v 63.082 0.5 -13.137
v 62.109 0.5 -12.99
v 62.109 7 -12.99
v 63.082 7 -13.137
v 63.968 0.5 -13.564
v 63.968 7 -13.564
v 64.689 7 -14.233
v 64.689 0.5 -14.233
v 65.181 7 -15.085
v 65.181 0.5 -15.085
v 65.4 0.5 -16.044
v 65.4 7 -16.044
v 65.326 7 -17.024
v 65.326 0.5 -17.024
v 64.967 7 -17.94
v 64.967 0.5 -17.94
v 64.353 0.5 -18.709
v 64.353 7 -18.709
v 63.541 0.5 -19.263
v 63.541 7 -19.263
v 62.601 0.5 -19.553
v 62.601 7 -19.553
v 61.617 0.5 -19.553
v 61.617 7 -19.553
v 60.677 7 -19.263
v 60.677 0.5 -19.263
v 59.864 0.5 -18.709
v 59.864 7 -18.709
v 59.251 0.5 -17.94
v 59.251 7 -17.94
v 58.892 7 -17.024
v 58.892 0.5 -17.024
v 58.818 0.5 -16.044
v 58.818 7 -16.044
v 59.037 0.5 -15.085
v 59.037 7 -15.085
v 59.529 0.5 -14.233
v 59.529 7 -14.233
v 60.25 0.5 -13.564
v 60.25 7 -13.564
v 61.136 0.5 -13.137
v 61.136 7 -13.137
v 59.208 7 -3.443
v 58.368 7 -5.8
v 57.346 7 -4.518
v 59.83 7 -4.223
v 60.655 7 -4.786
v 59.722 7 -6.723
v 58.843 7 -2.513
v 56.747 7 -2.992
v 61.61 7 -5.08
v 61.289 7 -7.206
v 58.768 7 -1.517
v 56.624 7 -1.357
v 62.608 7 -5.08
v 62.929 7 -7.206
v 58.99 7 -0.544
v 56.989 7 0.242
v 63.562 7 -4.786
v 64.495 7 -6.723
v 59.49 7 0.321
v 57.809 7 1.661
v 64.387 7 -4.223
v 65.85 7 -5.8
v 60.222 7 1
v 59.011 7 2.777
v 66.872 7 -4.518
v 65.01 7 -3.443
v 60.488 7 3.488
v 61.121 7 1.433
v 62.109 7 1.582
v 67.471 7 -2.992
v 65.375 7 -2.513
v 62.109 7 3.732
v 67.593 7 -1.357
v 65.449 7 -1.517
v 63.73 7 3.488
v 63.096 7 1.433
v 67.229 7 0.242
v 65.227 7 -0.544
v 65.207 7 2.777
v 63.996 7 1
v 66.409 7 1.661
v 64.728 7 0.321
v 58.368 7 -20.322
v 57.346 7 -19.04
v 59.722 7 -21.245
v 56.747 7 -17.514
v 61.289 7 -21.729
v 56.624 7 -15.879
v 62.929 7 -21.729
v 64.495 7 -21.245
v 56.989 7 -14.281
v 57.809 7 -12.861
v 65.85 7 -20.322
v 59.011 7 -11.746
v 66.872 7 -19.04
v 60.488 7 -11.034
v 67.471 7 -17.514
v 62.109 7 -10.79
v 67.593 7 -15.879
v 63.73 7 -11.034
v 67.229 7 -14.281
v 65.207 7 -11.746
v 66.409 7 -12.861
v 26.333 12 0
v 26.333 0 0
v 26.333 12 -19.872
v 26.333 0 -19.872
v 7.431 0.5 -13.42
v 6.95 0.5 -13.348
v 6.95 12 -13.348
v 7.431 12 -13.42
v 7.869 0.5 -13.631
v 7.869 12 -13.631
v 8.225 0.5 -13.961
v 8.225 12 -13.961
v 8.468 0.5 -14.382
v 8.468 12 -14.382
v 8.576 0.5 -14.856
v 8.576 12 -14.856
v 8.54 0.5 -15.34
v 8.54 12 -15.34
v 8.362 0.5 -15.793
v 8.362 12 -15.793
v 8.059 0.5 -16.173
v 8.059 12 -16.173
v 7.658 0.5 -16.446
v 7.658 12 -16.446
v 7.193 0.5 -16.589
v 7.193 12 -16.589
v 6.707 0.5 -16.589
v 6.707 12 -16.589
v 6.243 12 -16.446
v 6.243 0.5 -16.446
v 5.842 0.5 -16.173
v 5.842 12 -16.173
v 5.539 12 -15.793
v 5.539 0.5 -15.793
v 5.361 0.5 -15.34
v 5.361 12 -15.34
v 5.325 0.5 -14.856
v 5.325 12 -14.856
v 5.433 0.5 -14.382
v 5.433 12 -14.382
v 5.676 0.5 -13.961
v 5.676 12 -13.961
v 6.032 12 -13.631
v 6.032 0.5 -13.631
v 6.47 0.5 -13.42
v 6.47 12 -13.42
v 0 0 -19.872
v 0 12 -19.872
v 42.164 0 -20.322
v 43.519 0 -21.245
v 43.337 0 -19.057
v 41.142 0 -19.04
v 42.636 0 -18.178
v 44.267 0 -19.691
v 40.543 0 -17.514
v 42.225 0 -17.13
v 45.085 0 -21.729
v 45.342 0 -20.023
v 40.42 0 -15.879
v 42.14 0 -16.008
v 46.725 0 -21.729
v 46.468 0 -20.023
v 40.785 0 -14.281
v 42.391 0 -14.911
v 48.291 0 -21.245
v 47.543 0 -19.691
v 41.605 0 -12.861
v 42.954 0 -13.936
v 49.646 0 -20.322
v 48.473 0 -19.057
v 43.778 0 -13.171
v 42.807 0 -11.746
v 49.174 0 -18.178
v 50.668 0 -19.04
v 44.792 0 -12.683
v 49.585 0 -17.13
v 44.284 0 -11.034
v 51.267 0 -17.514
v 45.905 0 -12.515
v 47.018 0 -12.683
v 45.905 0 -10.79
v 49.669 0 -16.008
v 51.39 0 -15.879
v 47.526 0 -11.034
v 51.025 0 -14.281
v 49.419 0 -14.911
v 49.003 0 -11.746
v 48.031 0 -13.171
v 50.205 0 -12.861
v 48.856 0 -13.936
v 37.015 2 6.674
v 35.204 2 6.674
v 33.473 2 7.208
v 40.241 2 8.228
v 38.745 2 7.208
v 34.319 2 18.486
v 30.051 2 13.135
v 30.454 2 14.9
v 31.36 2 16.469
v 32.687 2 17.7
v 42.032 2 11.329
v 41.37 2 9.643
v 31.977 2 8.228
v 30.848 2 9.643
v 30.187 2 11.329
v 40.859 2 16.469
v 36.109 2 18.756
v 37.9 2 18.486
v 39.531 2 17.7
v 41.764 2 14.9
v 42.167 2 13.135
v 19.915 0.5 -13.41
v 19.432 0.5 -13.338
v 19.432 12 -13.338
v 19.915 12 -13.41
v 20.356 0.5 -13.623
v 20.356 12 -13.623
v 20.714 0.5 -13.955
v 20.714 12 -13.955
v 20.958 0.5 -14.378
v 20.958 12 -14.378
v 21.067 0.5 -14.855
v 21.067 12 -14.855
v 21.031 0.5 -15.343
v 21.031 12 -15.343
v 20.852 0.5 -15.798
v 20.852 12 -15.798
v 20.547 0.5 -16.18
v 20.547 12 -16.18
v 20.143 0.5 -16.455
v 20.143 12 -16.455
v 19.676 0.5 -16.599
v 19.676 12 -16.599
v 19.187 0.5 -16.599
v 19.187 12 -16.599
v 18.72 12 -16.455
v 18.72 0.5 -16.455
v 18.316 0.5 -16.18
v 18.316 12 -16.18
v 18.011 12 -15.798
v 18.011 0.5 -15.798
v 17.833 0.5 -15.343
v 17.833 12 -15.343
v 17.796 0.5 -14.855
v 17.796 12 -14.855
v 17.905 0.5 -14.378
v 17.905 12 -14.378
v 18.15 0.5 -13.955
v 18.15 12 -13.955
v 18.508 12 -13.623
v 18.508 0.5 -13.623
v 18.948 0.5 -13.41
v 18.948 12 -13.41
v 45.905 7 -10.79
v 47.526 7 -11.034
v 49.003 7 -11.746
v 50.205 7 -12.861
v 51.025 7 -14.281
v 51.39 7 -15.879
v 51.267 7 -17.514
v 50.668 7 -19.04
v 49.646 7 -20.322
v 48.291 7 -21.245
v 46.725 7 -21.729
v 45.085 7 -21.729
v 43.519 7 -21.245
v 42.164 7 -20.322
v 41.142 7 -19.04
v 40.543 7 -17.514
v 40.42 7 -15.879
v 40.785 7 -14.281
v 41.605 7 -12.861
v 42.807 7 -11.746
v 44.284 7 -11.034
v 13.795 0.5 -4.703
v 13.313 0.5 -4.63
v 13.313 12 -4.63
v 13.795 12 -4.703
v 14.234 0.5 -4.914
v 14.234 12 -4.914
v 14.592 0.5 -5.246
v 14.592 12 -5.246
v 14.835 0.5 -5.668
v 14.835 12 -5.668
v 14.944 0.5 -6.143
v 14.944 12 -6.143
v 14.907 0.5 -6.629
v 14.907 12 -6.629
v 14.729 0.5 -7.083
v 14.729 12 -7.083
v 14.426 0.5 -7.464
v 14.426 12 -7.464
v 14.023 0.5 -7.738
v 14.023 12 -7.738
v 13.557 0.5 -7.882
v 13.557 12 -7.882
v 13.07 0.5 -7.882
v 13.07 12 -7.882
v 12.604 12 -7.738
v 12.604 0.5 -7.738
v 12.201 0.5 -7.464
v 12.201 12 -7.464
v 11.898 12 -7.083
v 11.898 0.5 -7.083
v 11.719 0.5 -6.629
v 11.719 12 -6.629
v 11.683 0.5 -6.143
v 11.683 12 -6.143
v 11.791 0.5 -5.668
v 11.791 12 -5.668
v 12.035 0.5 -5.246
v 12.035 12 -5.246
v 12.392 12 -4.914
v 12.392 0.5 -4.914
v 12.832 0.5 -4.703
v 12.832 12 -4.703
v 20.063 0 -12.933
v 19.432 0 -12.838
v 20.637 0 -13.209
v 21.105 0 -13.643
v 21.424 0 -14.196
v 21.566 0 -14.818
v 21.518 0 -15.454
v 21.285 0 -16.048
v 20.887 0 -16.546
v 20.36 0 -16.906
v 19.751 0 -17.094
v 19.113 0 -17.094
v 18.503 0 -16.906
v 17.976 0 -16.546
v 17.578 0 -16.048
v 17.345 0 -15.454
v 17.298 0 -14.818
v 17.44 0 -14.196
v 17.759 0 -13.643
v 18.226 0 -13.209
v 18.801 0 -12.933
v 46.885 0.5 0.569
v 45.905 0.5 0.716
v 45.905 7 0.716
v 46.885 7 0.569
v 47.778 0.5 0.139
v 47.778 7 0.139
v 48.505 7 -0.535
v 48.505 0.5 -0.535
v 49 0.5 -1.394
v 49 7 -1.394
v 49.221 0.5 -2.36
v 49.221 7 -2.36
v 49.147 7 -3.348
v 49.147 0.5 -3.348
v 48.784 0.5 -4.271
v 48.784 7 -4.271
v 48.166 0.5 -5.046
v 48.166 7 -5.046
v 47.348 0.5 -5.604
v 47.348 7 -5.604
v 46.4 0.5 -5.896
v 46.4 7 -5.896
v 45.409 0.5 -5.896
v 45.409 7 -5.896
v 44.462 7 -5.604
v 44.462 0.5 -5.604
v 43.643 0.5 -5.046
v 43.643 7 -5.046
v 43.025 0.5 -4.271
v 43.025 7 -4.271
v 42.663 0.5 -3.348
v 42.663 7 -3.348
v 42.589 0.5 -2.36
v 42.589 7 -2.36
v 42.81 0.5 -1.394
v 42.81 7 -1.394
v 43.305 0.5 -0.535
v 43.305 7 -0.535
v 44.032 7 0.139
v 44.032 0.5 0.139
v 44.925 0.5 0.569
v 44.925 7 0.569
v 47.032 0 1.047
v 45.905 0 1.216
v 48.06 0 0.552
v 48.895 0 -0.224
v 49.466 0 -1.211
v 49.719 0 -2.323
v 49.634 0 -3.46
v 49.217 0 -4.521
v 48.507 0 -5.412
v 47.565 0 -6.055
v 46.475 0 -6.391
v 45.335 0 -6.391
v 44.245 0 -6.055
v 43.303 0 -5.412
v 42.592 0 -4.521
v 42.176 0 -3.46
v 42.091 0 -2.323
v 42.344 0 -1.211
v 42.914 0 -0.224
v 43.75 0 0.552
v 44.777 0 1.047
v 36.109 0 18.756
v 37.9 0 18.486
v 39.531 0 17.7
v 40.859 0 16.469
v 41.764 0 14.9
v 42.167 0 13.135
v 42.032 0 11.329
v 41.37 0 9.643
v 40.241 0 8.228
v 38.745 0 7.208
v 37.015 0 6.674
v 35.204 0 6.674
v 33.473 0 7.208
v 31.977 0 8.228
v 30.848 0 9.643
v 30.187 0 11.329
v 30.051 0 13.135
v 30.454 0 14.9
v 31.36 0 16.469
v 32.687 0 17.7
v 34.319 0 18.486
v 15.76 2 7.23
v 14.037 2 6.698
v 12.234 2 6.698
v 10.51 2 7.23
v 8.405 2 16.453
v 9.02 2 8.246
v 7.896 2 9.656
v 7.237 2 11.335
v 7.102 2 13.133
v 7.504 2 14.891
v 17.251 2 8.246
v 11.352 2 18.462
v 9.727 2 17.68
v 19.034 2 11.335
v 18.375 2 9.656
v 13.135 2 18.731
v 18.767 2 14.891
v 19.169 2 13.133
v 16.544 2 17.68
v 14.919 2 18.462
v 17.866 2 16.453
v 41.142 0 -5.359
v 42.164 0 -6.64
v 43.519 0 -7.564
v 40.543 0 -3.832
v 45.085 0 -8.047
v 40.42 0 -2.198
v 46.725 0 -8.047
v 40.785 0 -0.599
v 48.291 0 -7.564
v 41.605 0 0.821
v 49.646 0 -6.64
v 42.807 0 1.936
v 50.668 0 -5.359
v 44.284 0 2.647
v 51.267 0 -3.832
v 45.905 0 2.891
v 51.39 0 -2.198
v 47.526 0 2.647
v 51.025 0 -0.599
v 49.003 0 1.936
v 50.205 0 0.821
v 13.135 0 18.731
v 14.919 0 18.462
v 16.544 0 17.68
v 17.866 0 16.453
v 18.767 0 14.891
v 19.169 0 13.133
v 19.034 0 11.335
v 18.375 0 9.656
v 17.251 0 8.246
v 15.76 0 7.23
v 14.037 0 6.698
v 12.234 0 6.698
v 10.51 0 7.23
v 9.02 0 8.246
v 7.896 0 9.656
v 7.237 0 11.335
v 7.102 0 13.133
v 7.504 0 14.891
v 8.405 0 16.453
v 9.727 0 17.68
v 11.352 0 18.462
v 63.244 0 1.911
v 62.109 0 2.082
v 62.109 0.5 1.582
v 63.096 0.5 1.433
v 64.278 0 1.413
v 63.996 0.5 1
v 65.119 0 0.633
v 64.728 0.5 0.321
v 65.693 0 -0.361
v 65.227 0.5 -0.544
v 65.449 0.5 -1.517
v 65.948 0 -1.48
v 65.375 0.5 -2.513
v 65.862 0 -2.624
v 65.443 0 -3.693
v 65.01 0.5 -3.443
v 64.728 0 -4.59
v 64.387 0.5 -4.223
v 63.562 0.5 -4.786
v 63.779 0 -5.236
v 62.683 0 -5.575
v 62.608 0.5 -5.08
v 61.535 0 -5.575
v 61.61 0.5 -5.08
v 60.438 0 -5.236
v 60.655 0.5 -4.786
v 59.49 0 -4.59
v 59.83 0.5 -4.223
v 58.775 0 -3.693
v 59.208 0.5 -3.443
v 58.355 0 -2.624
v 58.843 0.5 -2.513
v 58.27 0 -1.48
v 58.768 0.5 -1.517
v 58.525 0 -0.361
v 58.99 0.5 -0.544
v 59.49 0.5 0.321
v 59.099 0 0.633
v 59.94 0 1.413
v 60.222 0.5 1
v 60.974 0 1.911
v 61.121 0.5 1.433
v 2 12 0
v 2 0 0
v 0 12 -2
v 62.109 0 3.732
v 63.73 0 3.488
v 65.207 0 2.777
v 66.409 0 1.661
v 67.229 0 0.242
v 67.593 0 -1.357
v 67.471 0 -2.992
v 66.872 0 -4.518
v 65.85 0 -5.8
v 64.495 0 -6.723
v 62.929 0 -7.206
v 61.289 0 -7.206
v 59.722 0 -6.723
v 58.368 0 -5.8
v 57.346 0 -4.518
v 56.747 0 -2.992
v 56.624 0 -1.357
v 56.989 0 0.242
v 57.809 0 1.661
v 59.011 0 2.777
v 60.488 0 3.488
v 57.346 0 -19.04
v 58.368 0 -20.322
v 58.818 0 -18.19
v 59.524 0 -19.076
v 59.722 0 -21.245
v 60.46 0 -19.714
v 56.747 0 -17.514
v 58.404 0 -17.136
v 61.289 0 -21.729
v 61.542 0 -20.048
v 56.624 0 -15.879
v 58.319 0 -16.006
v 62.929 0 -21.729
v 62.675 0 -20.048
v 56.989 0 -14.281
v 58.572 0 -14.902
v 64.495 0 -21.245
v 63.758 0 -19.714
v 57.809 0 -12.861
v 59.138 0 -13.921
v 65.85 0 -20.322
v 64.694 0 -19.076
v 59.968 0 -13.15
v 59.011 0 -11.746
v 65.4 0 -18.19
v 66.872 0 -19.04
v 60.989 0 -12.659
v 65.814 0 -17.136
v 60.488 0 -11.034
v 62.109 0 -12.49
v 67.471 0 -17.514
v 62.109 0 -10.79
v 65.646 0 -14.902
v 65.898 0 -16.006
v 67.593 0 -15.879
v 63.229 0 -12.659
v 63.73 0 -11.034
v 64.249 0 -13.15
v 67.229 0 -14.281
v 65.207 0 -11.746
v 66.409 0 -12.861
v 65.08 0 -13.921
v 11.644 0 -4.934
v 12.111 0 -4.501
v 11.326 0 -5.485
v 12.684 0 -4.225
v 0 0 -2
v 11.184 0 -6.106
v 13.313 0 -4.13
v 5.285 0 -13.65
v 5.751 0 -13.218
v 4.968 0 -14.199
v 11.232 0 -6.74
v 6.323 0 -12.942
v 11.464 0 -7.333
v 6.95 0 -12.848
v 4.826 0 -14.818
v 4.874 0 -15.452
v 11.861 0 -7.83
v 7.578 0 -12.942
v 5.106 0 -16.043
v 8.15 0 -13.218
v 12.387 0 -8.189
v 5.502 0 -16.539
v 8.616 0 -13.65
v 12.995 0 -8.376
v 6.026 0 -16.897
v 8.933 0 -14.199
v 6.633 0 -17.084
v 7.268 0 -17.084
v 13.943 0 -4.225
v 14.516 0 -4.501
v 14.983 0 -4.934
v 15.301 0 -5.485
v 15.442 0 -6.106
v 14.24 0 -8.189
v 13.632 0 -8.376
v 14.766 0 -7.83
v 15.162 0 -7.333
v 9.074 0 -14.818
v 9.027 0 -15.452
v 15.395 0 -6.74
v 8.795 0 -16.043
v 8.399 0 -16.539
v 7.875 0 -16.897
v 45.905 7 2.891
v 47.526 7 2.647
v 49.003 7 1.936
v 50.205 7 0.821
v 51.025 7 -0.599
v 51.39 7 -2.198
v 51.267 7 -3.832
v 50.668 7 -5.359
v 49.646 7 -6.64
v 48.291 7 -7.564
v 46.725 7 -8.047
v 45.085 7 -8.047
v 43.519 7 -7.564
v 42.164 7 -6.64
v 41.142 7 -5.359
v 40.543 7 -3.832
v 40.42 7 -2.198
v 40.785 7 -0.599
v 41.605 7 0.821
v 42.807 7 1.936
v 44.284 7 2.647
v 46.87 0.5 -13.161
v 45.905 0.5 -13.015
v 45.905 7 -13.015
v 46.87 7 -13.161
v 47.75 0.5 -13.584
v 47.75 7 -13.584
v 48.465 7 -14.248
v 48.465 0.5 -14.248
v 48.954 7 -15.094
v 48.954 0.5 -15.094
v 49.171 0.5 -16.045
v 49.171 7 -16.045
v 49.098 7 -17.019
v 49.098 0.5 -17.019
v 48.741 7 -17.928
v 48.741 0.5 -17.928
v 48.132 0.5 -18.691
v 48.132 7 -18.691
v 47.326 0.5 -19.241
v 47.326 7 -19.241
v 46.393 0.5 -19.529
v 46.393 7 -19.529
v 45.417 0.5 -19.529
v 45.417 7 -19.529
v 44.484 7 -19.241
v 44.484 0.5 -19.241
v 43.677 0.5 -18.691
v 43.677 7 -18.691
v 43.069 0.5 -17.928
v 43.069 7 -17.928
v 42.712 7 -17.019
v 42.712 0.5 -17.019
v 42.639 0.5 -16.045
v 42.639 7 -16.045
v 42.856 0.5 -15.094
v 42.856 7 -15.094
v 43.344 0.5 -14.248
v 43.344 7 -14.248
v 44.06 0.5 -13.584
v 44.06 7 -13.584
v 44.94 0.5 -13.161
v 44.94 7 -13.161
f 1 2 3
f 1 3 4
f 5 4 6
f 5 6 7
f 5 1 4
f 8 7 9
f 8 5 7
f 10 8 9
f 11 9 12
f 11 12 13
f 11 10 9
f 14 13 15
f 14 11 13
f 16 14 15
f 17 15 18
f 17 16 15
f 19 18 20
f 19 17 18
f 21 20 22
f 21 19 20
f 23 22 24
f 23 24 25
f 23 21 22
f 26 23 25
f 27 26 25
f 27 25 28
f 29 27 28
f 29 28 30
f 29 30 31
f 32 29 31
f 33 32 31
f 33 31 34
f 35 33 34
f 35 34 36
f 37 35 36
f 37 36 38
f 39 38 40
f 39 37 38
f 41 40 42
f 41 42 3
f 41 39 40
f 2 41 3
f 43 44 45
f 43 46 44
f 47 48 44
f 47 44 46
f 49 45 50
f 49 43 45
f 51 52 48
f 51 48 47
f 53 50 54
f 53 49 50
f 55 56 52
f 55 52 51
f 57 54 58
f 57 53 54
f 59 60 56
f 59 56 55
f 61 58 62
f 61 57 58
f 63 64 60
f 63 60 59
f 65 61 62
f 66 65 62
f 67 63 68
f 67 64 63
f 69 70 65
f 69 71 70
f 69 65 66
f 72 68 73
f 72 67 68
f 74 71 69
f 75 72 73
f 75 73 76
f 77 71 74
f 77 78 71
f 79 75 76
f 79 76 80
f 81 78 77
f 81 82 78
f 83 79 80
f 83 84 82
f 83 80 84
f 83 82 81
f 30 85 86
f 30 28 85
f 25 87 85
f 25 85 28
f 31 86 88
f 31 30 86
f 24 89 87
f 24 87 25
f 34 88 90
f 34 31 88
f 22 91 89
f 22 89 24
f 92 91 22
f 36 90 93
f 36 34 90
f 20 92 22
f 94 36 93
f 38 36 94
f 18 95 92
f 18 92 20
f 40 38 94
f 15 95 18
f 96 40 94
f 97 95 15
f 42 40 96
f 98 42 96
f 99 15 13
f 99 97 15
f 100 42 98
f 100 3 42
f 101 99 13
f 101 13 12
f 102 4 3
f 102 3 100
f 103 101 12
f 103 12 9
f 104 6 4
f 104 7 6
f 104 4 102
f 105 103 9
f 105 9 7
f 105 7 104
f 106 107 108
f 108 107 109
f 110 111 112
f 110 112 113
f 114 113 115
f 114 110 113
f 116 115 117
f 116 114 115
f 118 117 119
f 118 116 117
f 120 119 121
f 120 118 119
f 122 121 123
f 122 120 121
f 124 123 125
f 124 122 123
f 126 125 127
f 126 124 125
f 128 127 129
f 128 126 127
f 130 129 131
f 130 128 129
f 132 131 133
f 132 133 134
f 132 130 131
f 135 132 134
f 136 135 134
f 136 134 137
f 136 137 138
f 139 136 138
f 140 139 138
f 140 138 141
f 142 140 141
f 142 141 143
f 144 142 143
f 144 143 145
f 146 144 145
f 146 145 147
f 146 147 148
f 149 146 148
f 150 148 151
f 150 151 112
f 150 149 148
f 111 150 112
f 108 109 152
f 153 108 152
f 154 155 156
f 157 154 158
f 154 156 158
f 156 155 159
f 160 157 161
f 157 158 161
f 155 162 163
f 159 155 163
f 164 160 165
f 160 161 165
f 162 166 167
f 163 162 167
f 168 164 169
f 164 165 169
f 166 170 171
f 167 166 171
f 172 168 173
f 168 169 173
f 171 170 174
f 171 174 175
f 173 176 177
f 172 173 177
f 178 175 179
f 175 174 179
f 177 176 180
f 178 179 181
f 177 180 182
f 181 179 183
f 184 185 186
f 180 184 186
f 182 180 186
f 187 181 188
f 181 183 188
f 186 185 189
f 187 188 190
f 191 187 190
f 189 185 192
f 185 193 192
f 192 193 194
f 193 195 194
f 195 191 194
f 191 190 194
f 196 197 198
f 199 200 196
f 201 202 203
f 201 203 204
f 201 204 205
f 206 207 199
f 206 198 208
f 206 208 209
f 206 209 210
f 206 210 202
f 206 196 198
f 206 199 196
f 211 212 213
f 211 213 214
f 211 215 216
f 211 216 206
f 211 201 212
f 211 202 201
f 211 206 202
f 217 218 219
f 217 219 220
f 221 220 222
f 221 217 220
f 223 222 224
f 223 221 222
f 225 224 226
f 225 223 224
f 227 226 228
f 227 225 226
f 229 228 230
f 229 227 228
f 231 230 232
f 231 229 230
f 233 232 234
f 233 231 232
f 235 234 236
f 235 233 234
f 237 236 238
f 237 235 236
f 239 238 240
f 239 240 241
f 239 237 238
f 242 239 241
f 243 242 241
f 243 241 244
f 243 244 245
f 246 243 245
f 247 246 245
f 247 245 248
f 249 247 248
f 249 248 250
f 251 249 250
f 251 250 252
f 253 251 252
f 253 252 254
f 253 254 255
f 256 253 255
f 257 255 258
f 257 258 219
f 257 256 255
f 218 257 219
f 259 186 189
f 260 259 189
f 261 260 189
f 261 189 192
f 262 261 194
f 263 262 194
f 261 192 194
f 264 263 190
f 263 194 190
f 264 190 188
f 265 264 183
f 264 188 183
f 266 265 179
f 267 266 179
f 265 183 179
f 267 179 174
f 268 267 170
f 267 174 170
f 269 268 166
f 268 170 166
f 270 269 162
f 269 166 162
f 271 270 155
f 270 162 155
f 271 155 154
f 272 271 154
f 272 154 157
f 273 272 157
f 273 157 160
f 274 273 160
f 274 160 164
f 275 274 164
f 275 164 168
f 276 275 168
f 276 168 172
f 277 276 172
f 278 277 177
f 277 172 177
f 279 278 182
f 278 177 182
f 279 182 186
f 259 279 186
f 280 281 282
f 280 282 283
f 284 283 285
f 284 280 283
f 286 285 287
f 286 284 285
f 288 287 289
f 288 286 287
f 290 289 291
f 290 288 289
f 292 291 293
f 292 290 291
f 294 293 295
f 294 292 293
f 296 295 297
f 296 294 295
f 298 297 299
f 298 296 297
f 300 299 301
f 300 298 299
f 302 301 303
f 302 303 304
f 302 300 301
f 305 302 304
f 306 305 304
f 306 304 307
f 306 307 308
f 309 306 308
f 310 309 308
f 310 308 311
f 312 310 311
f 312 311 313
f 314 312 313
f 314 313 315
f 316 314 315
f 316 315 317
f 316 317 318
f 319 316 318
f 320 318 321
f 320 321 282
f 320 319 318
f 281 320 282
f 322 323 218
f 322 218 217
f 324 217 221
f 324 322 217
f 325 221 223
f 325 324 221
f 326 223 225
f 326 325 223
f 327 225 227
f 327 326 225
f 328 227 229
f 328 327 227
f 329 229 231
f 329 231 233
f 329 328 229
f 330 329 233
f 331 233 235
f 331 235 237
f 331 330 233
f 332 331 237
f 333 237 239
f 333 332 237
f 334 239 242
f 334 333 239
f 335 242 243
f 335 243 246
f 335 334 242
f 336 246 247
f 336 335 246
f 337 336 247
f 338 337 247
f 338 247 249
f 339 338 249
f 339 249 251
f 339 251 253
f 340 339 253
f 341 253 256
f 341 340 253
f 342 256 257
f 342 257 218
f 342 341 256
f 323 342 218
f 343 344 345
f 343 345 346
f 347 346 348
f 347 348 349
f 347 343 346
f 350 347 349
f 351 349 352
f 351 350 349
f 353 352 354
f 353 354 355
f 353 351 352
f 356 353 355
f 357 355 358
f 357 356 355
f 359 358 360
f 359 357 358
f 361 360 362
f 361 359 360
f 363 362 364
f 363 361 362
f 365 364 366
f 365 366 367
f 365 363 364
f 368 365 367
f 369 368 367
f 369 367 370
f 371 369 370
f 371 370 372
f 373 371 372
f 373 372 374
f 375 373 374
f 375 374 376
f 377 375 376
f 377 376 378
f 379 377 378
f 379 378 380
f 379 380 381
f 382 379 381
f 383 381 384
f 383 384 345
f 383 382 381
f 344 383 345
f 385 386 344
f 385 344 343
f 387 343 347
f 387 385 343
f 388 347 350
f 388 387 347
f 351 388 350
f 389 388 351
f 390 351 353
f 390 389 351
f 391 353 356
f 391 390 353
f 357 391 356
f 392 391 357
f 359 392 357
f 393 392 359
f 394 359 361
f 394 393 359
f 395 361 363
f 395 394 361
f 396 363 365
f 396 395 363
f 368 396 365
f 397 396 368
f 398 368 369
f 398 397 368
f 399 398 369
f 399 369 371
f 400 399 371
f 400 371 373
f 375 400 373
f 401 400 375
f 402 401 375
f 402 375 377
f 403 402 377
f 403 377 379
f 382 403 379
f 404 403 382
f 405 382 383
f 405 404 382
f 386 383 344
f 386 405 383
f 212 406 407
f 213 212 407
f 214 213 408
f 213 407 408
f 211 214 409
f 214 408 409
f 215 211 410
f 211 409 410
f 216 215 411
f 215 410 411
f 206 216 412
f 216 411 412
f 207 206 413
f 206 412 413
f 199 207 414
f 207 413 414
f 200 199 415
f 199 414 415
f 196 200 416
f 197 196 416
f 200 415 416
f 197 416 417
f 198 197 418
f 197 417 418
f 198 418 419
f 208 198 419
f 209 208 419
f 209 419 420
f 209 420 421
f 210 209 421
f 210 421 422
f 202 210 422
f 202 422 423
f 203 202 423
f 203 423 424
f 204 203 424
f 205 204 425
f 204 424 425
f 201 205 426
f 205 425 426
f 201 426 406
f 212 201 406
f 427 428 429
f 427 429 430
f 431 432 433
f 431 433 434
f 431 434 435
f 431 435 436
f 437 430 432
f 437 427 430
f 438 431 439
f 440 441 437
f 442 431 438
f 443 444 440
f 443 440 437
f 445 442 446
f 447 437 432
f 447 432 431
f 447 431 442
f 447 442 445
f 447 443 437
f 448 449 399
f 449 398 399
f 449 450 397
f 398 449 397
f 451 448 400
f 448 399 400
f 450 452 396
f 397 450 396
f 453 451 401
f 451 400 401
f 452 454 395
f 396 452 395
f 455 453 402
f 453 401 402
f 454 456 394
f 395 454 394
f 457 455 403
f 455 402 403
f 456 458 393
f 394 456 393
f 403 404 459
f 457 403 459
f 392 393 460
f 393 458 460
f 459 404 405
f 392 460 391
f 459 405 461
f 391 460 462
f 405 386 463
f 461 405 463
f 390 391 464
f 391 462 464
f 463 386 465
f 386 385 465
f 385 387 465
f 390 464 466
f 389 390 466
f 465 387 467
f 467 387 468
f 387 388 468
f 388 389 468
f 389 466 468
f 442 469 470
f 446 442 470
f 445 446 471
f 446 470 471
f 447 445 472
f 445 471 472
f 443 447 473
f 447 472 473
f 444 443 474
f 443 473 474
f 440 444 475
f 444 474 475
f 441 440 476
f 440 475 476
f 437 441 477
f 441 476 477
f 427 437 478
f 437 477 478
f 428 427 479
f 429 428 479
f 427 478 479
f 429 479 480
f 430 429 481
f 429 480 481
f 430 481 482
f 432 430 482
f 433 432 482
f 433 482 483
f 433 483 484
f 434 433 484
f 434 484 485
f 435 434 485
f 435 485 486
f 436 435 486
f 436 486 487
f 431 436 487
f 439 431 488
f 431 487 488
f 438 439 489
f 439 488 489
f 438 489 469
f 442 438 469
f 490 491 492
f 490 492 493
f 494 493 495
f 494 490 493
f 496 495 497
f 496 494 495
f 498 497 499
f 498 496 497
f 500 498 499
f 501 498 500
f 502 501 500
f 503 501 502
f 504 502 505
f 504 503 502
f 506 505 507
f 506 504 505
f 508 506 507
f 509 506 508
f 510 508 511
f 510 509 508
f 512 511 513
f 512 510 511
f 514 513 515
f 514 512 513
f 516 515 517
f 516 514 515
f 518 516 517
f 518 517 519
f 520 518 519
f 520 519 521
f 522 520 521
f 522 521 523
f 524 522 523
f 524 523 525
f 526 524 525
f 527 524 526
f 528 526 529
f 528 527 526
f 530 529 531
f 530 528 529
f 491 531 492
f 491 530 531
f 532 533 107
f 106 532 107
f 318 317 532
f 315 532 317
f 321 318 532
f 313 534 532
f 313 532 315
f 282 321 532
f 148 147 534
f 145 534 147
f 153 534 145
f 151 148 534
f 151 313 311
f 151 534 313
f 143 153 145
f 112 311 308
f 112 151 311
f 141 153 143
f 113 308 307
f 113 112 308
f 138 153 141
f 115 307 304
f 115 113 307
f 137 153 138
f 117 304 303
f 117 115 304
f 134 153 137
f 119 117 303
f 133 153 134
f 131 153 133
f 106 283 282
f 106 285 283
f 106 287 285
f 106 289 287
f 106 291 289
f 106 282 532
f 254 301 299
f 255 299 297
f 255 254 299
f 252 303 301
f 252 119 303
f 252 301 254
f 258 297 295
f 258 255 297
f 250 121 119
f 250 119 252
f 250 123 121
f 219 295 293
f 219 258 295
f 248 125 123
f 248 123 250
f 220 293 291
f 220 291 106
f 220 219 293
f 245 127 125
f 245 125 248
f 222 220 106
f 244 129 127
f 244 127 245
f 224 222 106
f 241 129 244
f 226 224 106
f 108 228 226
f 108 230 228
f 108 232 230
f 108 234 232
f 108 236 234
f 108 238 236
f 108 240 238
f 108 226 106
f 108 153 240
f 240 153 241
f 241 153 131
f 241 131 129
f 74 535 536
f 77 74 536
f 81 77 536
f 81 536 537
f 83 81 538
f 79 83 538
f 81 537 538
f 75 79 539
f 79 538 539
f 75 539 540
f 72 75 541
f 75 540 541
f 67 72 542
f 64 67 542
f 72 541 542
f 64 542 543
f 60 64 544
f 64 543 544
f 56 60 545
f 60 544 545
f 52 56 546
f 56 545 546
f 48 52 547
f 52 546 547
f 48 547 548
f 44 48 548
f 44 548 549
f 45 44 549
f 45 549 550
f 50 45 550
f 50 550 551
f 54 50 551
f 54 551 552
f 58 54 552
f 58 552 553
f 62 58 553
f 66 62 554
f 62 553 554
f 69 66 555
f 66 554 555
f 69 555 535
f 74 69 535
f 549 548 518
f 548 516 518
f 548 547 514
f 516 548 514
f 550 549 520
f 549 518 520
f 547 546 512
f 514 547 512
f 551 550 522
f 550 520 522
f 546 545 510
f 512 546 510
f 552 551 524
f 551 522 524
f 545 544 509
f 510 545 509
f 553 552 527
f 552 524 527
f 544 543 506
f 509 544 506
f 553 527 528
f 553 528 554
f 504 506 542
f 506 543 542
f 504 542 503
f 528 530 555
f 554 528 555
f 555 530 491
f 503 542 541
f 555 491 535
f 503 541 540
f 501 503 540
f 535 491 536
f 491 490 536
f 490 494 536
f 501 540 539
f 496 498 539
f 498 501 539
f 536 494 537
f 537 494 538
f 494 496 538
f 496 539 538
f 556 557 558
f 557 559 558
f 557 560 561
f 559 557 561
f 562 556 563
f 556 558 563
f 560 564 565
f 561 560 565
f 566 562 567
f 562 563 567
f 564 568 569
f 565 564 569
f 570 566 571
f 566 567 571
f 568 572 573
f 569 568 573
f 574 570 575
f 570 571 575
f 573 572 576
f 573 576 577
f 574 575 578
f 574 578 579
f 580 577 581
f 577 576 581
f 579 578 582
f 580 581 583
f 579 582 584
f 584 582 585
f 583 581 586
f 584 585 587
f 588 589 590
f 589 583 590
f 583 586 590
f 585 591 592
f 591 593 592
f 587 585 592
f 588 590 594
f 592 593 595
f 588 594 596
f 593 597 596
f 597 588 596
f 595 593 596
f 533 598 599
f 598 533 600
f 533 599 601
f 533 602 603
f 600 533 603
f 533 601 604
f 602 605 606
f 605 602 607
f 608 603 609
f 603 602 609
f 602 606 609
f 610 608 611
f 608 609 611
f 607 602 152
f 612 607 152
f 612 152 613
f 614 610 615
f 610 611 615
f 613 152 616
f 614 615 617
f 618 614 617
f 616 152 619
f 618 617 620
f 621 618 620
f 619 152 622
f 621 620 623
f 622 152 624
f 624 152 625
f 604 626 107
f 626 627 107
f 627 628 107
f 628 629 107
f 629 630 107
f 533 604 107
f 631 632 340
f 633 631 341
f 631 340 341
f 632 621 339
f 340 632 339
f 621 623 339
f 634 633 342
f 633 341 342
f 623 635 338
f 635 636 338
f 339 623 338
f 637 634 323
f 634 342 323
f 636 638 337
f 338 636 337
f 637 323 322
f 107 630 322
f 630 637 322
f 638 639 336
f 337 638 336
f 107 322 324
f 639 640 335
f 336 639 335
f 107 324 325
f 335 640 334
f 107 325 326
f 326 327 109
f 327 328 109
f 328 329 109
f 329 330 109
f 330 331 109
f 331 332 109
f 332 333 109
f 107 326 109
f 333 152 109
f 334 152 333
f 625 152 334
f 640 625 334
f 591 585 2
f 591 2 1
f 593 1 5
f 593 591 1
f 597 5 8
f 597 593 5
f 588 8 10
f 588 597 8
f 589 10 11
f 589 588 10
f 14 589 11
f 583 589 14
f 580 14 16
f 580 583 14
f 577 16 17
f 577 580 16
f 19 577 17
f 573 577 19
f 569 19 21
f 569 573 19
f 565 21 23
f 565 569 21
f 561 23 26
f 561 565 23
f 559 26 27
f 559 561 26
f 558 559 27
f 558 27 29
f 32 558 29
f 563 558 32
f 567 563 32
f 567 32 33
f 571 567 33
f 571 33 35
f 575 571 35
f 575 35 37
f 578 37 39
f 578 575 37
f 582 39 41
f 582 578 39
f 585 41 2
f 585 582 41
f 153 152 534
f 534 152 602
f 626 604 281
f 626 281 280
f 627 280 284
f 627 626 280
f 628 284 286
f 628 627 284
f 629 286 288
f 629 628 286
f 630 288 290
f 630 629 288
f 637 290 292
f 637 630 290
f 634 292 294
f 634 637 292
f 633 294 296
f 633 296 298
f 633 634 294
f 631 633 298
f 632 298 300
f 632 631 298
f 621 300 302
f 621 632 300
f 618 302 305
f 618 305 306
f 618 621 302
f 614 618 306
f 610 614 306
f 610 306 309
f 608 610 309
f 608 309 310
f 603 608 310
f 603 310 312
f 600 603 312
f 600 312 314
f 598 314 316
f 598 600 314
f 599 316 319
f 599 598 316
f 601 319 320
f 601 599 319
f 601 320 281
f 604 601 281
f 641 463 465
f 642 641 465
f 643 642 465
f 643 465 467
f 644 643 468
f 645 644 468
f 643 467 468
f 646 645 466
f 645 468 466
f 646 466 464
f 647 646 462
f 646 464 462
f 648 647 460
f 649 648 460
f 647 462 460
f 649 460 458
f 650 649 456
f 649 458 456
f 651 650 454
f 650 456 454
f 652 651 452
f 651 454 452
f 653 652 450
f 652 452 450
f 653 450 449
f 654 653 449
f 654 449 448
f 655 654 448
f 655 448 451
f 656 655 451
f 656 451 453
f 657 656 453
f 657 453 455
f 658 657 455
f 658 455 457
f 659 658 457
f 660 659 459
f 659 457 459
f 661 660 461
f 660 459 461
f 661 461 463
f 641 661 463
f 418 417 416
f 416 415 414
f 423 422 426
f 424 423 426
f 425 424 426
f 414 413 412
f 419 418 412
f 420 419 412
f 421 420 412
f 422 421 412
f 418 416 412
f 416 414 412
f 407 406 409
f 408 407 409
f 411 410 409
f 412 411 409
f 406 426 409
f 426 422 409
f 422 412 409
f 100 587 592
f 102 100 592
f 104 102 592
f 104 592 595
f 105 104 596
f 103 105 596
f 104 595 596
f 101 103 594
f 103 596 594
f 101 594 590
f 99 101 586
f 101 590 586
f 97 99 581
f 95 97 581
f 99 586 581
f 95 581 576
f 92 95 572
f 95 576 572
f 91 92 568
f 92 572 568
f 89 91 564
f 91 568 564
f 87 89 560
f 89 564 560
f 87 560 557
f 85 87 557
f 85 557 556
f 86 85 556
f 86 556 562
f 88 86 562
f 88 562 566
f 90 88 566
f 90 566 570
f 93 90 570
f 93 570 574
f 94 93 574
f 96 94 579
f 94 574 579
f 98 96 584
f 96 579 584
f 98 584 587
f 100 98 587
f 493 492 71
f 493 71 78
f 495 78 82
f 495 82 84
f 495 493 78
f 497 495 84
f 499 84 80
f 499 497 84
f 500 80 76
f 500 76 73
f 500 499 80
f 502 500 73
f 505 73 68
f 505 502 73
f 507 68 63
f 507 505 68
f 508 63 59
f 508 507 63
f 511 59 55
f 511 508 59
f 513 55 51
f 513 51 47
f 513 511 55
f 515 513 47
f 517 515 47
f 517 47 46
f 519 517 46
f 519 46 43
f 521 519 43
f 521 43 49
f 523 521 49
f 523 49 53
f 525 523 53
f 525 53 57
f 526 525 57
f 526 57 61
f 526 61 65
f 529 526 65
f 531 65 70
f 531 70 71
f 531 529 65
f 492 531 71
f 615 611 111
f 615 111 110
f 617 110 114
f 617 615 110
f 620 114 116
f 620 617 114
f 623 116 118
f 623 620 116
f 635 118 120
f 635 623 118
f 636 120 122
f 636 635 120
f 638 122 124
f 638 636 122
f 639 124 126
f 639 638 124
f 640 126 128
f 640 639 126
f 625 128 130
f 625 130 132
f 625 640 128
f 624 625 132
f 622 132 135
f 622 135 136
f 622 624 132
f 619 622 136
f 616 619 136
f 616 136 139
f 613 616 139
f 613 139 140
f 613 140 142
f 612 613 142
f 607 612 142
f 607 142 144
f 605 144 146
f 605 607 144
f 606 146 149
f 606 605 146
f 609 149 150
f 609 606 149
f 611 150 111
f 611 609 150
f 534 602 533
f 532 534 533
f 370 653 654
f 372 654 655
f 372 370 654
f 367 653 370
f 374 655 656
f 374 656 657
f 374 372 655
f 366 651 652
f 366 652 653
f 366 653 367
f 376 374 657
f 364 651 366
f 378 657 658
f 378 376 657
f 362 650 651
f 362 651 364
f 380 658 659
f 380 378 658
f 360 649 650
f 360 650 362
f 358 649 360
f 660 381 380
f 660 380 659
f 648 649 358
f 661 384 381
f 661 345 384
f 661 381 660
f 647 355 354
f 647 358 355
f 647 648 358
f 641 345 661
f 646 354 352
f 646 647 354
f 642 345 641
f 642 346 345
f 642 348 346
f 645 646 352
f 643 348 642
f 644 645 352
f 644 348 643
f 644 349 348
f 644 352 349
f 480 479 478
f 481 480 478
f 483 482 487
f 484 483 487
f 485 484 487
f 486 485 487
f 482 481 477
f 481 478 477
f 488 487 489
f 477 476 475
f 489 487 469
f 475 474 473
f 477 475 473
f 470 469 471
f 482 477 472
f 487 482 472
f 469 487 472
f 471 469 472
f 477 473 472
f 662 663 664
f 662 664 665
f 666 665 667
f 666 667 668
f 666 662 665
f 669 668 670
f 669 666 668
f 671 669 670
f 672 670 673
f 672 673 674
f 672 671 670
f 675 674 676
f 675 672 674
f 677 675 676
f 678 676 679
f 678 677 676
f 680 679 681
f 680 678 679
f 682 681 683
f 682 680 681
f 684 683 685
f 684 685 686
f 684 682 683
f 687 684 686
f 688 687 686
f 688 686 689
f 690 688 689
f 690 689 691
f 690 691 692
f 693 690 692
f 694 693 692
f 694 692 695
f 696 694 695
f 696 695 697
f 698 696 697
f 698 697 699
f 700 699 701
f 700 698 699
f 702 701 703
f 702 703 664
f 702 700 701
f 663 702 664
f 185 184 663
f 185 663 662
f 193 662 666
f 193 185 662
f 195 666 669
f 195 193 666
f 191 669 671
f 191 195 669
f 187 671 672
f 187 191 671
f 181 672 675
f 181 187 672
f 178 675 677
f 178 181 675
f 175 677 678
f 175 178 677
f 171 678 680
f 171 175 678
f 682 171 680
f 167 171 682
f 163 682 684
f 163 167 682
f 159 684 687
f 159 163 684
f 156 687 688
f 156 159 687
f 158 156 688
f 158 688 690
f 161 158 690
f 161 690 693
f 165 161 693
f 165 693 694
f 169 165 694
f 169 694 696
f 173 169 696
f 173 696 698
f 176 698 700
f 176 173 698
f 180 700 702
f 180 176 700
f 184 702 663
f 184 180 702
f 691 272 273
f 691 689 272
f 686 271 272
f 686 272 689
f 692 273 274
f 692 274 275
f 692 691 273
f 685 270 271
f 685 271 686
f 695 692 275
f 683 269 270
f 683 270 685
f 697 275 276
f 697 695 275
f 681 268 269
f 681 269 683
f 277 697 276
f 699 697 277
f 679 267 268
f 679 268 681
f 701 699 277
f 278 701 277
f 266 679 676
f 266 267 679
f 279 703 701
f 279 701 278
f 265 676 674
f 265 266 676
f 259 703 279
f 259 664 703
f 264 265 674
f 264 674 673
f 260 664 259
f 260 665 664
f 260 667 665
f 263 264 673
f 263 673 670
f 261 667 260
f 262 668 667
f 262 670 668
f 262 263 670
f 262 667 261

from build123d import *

# Parameters (mm, degrees)
SKETCH1_R             = 1.63
SKETCH1_R_2           = 1.635
SKETCH1_R_3           = 1.64
BOSS_EXTRUDE1_DEPTH   = 12
SKETCH2_R             = 5.5
SKETCH2_R_2           = 3.275
BOSS_EXTRUDE2_DEPTH   = 7
SKETCH2_R_3           = 3.3
BOSS_EXTRUDE2_2_DEPTH = 7
SKETCH2_R_4           = 3.325
BOSS_EXTRUDE2_3_DEPTH = 7
SKETCH2_R_5           = 3.35
BOSS_EXTRUDE2_4_DEPTH = 7
SKETCH3_R             = 6.05
BOSS_EXTRUDE3_DEPTH   = 2
SKETCH3_R_2           = 6.075
BOSS_EXTRUDE3_2_DEPTH = 2
CHAMFER1_SIZE         = 0.5
CHAMFER2_SIZE         = 0.5
CHAMFER3_SIZE         = 0.5
CHAMFER4_SIZE         = 0.5
CHAMFER5_SIZE         = 0.5


with BuildPart() as part:
    # Sketch1 → Boss-Extrude1 (new body)
    with BuildSketch(Plane(origin=(0, 0, 0), x_dir=(1, 0, 0), z_dir=(0, 1, 0))):
        Polygon((0, 2), (2, 0), (26.333228461, 0), (26.333228461, 19.872287649), (0, 19.872287649), align=None)
        with Locations(Location((6.950406025, 14.977635519, 0), (0, 0, 270))):
            Circle(SKETCH1_R, mode=Mode.SUBTRACT)
        with Locations(Location((13.313453795, 6.265154727, 0), (0, 0, 270))):
            Circle(SKETCH1_R_2, mode=Mode.SUBTRACT)
        with Locations(Location((19.431768957, 14.977635519, 0), (0, 0, 270))):
            Circle(SKETCH1_R_3, mode=Mode.SUBTRACT)
    extrude(amount=BOSS_EXTRUDE1_DEPTH)

    # Chamfer5
    chamfer5_edges = [part.edges().sort_by_distance(p)[0] for p in [
        (6.950406025, 0, -16.607635519),
        (13.313453795, 0, -7.900154727),
        (19.431768957, 0, -16.617635519),
    ]]
    chamfer(chamfer5_edges, length=CHAMFER5_SIZE)


with BuildPart() as body_2:
    # Sketch2 → Boss-Extrude2 (new body)
    with BuildSketch(Plane(origin=(0, 0, 0), x_dir=(1, 0, 0), z_dir=(0, 1, 0))):
        with Locations(Location((45.904915305, 16.290147447, 0), (0, 0, 270))):
            Circle(SKETCH2_R)
        with Locations(Location((45.904915305, 16.290147447, 0), (0, 0, 270))):
            Circle(SKETCH2_R_2, mode=Mode.SUBTRACT)
    extrude(amount=BOSS_EXTRUDE2_DEPTH)

    # Chamfer4
    chamfer4_edges = [body_2.edges().sort_by_distance(p)[0] for p in [
        (45.904915305, 0, -19.565147447),
    ]]
    chamfer(chamfer4_edges, length=CHAMFER4_SIZE)


with BuildPart() as body_3:
    # Sketch2 → Boss-Extrude2 2 (new body)
    with BuildSketch(Plane(origin=(0, 0, 0), x_dir=(1, 0, 0), z_dir=(0, 1, 0))):
        with Locations(Location((62.108845123, 16.290147447, 0), (0, 0, 270))):
            Circle(SKETCH2_R)
        with Locations(Location((62.108845123, 16.290147447, 0), (0, 0, 270))):
            Circle(SKETCH2_R_3, mode=Mode.SUBTRACT)
    extrude(amount=BOSS_EXTRUDE2_2_DEPTH)

    # Chamfer3
    chamfer3_edges = [body_3.edges().sort_by_distance(p)[0] for p in [
        (62.108845123, 0, -19.590147447),
    ]]
    chamfer(chamfer3_edges, length=CHAMFER3_SIZE)


with BuildPart() as body_4:
    # Sketch2 → Boss-Extrude2 3 (new body)
    with BuildSketch(Plane(origin=(0, 0, 0), x_dir=(1, 0, 0), z_dir=(0, 1, 0))):
        with Locations(Location((45.904915305, 2.60852746, 0), (0, 0, 270))):
            Circle(SKETCH2_R)
        with Locations(Location((45.904915305, 2.60852746, 0), (0, 0, 270))):
            Circle(SKETCH2_R_4, mode=Mode.SUBTRACT)
    extrude(amount=BOSS_EXTRUDE2_3_DEPTH)

    # Chamfer1
    chamfer1_edges = [body_4.edges().sort_by_distance(p)[0] for p in [
        (45.904915305, 0, -5.93352746),
    ]]
    chamfer(chamfer1_edges, length=CHAMFER1_SIZE)


with BuildPart() as body_5:
    # Sketch2 → Boss-Extrude2 4 (new body)
    with BuildSketch(Plane(origin=(0, 0, 0), x_dir=(1, 0, 0), z_dir=(0, 1, 0))):
        with Locations(Location((62.108845123, 1.767757517, 0), (0, 0, 270))):
            Circle(SKETCH2_R)
        with Locations(Location((62.108845123, 1.767757517, 0), (0, 0, 270))):
            Circle(SKETCH2_R_5, mode=Mode.SUBTRACT)
    extrude(amount=BOSS_EXTRUDE2_4_DEPTH)

    # Chamfer2
    chamfer2_edges = [body_5.edges().sort_by_distance(p)[0] for p in [
        (62.108845123, 0, -5.117757517),
    ]]
    chamfer(chamfer2_edges, length=CHAMFER2_SIZE)


with BuildPart() as body_6:
    # Sketch3 → Boss-Extrude3 (new body)
    with BuildSketch(Plane(origin=(0, 0, 0), x_dir=(1, 0, 0), z_dir=(0, 1, 0))):
        with Locations(Location((13.135466649, -12.680886102, 0), (0, 0, 270))):
            Circle(SKETCH3_R)
    extrude(amount=BOSS_EXTRUDE3_DEPTH)


with BuildPart() as body_7:
    # Sketch3 → Boss-Extrude3 2 (new body)
    with BuildSketch(Plane(origin=(0, 0, 0), x_dir=(1, 0, 0), z_dir=(0, 1, 0))):
        with Locations(Location((36.109234192, -12.680886102, 0), (0, 0, 270))):
            Circle(SKETCH3_R_2)
    extrude(amount=BOSS_EXTRUDE3_2_DEPTH)


solid = Compound([part.part, body_2.part, body_3.part, body_4.part, body_5.part, body_6.part, body_7.part])
